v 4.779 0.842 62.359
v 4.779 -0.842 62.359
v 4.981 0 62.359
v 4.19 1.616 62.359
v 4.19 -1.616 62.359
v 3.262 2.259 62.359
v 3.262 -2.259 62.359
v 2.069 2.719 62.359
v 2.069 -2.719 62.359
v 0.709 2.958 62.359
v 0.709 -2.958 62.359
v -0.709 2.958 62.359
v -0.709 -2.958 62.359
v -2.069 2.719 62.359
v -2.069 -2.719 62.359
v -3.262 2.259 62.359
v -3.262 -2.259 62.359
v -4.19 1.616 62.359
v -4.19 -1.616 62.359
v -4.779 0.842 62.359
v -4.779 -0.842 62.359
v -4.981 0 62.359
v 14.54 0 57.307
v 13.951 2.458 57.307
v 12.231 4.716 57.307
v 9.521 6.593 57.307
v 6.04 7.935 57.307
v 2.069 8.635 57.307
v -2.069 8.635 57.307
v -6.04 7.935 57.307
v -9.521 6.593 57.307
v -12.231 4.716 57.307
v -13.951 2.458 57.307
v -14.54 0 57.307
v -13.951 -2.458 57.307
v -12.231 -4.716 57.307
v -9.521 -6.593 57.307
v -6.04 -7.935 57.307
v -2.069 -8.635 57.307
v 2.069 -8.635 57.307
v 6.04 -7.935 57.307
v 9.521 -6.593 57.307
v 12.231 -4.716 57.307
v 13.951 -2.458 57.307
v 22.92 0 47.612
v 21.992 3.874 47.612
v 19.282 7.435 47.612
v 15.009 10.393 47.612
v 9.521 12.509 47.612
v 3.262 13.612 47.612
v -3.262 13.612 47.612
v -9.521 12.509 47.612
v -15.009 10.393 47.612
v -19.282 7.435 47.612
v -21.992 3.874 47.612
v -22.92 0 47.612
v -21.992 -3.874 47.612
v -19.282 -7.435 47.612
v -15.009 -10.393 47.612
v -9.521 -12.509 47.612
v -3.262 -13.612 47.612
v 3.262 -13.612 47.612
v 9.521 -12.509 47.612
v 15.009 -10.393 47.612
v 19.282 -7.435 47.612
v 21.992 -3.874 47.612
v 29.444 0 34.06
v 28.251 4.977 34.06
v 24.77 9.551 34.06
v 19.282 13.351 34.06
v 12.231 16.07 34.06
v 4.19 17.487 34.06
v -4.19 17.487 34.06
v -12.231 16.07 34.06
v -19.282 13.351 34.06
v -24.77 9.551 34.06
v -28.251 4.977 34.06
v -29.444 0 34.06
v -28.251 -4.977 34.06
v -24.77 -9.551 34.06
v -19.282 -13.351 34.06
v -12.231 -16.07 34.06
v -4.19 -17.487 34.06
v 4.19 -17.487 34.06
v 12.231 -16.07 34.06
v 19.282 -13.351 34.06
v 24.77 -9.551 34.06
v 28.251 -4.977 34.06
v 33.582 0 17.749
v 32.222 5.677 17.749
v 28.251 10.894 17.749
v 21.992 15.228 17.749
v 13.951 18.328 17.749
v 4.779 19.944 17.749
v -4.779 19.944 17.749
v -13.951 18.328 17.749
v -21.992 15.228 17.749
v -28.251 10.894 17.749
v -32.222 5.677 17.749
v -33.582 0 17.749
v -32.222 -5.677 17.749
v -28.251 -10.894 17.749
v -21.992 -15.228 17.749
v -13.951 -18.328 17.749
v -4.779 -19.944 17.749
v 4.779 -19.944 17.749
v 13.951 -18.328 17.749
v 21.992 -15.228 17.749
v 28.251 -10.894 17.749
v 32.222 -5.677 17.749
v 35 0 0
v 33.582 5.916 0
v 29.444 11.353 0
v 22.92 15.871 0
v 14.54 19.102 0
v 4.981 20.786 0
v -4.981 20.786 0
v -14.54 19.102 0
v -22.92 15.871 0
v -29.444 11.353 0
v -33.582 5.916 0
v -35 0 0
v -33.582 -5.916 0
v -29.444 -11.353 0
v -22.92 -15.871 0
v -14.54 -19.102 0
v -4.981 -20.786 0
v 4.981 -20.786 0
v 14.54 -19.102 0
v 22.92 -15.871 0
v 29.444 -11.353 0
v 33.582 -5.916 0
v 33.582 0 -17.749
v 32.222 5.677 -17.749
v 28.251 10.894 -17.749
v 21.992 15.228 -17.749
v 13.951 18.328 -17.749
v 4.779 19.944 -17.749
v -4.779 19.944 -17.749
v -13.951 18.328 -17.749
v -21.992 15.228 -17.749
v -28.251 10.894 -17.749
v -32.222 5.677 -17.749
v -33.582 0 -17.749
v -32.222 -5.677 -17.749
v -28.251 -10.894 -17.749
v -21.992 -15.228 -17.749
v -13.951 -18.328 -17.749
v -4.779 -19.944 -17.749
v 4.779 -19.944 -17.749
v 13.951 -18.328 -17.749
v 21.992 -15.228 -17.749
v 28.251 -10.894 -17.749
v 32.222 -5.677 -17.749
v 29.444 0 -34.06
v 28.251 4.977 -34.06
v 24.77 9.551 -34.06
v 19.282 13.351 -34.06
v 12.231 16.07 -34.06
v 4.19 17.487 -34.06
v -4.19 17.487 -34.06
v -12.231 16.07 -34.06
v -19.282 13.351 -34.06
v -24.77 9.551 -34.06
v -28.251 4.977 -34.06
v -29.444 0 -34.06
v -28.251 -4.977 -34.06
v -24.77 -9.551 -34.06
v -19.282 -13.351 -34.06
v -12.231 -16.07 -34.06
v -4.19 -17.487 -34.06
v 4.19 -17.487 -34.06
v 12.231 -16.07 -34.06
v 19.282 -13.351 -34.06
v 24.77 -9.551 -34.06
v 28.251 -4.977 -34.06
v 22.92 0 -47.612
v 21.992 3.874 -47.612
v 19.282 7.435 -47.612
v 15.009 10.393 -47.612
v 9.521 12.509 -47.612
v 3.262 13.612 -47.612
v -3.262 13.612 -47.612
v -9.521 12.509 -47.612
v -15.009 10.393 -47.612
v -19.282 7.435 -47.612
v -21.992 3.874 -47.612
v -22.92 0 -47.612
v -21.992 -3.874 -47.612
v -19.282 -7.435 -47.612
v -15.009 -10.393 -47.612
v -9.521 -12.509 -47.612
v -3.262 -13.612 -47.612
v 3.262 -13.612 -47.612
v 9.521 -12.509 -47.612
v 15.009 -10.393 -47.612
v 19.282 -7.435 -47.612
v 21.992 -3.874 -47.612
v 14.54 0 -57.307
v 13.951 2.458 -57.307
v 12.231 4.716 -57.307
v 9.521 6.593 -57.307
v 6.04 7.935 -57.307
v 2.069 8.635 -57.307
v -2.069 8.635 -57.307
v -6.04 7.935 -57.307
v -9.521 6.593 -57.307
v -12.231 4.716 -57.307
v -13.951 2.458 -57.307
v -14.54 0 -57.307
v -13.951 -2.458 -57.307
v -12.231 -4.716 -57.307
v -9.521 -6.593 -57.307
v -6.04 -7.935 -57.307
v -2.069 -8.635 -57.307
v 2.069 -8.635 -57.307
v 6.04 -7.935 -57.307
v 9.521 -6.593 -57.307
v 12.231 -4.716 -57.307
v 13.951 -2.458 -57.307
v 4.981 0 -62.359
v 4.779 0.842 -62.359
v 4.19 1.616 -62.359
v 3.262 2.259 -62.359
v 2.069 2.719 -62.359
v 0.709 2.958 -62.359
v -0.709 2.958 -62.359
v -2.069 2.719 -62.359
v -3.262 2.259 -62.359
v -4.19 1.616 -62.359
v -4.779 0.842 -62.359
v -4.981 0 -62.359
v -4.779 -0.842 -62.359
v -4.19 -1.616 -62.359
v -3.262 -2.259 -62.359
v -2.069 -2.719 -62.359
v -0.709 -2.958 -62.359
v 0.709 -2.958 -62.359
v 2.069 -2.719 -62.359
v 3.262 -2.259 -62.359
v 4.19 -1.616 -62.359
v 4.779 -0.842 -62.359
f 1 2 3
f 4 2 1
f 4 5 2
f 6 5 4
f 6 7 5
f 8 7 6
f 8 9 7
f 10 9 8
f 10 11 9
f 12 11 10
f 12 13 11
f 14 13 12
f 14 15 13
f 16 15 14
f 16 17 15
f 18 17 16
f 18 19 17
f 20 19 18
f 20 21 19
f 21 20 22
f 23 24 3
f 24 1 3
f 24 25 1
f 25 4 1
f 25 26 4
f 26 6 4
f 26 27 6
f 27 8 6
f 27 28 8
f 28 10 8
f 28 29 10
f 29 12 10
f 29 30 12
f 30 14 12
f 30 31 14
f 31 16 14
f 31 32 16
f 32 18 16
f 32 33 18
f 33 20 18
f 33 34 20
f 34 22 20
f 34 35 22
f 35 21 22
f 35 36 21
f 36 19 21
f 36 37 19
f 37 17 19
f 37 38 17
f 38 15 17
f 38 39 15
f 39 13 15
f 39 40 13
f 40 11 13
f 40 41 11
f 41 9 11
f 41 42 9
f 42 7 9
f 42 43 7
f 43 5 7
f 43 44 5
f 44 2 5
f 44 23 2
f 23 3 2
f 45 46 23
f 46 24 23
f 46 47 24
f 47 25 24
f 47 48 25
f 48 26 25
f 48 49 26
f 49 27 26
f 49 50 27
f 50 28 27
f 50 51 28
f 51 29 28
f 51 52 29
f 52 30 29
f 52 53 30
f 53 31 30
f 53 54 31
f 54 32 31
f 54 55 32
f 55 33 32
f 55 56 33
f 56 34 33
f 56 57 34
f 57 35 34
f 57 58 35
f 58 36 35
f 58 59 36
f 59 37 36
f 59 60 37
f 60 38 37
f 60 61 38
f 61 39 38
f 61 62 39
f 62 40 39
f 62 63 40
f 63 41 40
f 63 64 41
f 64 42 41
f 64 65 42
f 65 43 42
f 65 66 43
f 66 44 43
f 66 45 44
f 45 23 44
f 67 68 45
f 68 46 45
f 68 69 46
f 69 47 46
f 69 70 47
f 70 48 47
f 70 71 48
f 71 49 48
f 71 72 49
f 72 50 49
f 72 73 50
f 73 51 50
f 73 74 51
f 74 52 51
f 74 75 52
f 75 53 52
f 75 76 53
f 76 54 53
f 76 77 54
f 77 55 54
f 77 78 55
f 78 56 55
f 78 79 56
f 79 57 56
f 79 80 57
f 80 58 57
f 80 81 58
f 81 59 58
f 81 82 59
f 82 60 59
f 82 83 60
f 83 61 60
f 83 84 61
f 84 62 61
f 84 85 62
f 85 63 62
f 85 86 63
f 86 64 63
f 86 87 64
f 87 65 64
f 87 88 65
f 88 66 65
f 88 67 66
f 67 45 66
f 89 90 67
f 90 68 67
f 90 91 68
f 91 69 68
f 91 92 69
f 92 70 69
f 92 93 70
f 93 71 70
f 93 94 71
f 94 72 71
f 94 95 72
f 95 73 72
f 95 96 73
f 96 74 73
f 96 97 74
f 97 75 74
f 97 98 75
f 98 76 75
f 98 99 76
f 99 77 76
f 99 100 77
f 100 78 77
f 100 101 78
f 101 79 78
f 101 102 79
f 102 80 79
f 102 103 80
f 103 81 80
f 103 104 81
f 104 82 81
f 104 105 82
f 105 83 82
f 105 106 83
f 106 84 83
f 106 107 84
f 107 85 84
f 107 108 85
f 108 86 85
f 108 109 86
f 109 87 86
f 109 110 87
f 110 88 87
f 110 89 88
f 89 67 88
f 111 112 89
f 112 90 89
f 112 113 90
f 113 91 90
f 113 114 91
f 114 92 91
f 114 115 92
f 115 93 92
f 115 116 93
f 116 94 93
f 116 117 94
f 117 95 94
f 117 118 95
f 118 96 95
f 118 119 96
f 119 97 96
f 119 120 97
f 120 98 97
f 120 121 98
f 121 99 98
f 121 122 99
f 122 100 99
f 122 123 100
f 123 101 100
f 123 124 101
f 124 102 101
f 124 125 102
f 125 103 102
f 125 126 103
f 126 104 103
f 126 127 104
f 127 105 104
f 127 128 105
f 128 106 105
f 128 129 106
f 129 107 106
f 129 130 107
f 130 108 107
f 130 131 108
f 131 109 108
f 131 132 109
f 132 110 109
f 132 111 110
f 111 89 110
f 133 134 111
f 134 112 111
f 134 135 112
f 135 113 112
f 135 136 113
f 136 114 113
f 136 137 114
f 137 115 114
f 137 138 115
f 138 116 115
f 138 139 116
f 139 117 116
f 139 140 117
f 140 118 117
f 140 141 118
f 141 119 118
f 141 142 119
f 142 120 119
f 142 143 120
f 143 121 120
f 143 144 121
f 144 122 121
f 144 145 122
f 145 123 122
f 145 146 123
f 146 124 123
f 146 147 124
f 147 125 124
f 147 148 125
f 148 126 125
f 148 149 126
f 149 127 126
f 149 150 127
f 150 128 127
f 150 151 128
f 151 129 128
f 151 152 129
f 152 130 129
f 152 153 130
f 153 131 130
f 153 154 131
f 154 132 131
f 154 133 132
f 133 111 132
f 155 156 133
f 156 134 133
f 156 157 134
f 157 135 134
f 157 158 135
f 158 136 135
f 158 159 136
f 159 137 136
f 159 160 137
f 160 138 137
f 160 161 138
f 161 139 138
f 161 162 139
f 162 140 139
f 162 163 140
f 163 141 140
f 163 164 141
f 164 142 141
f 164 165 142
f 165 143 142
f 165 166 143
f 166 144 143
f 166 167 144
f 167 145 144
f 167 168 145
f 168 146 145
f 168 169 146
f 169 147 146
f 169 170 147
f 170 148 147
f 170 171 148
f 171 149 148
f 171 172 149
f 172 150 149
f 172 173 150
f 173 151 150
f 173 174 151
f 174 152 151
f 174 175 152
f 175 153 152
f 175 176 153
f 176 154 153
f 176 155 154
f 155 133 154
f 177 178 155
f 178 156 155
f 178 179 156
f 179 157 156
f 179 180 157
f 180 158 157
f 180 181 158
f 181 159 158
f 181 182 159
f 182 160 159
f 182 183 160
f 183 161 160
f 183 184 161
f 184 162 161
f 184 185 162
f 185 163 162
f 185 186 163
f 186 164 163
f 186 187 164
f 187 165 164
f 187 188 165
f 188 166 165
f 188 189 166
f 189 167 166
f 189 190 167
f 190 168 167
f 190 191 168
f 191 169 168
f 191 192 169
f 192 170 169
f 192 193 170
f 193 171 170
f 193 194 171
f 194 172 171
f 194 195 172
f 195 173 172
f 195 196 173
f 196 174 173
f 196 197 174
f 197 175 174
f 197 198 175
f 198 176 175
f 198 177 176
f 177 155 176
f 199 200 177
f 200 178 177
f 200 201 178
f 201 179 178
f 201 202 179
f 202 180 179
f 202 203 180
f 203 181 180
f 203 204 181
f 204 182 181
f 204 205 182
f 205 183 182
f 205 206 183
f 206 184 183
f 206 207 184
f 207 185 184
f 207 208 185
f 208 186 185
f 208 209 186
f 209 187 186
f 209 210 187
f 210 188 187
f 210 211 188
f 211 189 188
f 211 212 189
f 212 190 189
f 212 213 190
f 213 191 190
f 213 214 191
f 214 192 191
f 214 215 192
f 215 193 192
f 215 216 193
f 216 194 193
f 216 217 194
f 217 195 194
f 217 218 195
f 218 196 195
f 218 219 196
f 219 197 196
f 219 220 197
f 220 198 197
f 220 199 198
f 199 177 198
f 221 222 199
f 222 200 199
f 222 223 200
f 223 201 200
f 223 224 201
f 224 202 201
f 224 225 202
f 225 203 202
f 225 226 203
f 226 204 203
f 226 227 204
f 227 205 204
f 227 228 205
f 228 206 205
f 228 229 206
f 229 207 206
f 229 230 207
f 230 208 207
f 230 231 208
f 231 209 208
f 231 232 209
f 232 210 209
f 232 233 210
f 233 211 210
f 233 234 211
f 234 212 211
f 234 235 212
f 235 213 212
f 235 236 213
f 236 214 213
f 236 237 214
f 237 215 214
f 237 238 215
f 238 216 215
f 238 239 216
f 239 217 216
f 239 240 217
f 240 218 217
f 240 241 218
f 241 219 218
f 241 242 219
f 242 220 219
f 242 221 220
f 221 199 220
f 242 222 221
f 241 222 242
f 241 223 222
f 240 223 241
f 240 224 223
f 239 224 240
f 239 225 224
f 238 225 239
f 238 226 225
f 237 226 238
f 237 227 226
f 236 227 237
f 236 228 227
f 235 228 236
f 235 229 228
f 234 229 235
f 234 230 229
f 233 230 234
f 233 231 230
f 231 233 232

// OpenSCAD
// Generated by SolidPython 1.0.1 on 2020-07-29 00:46:46


scale(v = [5, 3, 9]) {
	sphere(r = 7);
}
/***********************************************
*********      SolidPython code:      **********
************************************************
 
# import packages: SolidPython
from solid import *
from solid.utils import *
from itertools import chain, combinations, permutations


class Resize:

    def __init__(self, scad_file):
        self.scad_file = scad_file
        #self.scad_file = import_scad(scad_file)
        # cone/cylinder param:
        self.r1 = 0
        self.r2 = 0
        self.h = 0
        # rectangular prism param:
        self.w = 0
        self.l = 0
        # ellipse param:
        self.r = 0

    # import OpenScad code (file name corresponds to shape)


    # classify shape + parameters
    def assign(self, param1, param2, param3):
        if self.scad_file == 'cone.scad':
            self.r1 = param1
            self.r2 = param2
            self.h = param3
        elif self.scad_file == 'cylinder.scad':
            self.r1 = param1
            self.r2 = param2
            self.h = param3
        elif self.scad_file == 'rectangularPrism.scad':
            self.h = param1
            self.l = param2
            self.w = param3
        else:
            self.r = param1
            self.h = param2

    # resize parameters
    def iterate(self):
        x = range(3, 20, 2)
        i = 1
        if self.scad_file == 'cone.scad':
            tempList = list(permutations(x, 2))
            for temp in tempList:
                param1 = temp[0]
                param2 = temp[1]
                filepath = 'produced_scad_files/' + 'cone' + str(param1) + '_' + str(param2) + '_' + '.scad'
                scad_render_to_file(cylinder(h=param1, r1=param2, r2=0), filepath)

        elif self.scad_file == 'cylinder.scad':
            tempList = list(permutations(x, 3))
            for temp in tempList:
                param1 = temp[0]
                param2 = temp[1]
                filepath = 'produced_scad_files/' + 'cylinder' + str(param1) + '_' + str(param2) + '_' + '.scad'
                scad_render_to_file(cylinder(h=param1, r1=param2, r2=param2), filepath)

        elif self.scad_file == 'rectangularPrism.scad':
            tempList = list(permutations(x, 3))
            for temp in tempList:
                param1 = temp[0]
                param2 = temp[1]
                param3 = temp[2]
                filepath = 'produced_scad_files/' + 'rectangularPrism' + str(param1) + '_' + str(param2) + '_' + str(
                    param3) + '.scad'
                scad_render_to_file(cube(size=(param1, param2, param3)), filepath)

        elif self.scad_file == 'ellipse.scad':
            tempList = list(permutations(x, 4))
            for temp in tempList:
                param1 = temp[0]
                param2 = temp[1]
                param3 = temp[2]
                param4 = temp[3]
                filepath = 'produced_scad_files/' + 'ellipse' + str(param1) + '_' + str(param2) + '_' + str(param3) + '_' + str(param4) + '.scad'
                scad_render_to_file(scale([param1, param2, param3])(sphere(r=param4)), filepath)

    def render_to_scadfile(self):
        scad_render_to_file(scad, 'example.scad') 
 
************************************************/
